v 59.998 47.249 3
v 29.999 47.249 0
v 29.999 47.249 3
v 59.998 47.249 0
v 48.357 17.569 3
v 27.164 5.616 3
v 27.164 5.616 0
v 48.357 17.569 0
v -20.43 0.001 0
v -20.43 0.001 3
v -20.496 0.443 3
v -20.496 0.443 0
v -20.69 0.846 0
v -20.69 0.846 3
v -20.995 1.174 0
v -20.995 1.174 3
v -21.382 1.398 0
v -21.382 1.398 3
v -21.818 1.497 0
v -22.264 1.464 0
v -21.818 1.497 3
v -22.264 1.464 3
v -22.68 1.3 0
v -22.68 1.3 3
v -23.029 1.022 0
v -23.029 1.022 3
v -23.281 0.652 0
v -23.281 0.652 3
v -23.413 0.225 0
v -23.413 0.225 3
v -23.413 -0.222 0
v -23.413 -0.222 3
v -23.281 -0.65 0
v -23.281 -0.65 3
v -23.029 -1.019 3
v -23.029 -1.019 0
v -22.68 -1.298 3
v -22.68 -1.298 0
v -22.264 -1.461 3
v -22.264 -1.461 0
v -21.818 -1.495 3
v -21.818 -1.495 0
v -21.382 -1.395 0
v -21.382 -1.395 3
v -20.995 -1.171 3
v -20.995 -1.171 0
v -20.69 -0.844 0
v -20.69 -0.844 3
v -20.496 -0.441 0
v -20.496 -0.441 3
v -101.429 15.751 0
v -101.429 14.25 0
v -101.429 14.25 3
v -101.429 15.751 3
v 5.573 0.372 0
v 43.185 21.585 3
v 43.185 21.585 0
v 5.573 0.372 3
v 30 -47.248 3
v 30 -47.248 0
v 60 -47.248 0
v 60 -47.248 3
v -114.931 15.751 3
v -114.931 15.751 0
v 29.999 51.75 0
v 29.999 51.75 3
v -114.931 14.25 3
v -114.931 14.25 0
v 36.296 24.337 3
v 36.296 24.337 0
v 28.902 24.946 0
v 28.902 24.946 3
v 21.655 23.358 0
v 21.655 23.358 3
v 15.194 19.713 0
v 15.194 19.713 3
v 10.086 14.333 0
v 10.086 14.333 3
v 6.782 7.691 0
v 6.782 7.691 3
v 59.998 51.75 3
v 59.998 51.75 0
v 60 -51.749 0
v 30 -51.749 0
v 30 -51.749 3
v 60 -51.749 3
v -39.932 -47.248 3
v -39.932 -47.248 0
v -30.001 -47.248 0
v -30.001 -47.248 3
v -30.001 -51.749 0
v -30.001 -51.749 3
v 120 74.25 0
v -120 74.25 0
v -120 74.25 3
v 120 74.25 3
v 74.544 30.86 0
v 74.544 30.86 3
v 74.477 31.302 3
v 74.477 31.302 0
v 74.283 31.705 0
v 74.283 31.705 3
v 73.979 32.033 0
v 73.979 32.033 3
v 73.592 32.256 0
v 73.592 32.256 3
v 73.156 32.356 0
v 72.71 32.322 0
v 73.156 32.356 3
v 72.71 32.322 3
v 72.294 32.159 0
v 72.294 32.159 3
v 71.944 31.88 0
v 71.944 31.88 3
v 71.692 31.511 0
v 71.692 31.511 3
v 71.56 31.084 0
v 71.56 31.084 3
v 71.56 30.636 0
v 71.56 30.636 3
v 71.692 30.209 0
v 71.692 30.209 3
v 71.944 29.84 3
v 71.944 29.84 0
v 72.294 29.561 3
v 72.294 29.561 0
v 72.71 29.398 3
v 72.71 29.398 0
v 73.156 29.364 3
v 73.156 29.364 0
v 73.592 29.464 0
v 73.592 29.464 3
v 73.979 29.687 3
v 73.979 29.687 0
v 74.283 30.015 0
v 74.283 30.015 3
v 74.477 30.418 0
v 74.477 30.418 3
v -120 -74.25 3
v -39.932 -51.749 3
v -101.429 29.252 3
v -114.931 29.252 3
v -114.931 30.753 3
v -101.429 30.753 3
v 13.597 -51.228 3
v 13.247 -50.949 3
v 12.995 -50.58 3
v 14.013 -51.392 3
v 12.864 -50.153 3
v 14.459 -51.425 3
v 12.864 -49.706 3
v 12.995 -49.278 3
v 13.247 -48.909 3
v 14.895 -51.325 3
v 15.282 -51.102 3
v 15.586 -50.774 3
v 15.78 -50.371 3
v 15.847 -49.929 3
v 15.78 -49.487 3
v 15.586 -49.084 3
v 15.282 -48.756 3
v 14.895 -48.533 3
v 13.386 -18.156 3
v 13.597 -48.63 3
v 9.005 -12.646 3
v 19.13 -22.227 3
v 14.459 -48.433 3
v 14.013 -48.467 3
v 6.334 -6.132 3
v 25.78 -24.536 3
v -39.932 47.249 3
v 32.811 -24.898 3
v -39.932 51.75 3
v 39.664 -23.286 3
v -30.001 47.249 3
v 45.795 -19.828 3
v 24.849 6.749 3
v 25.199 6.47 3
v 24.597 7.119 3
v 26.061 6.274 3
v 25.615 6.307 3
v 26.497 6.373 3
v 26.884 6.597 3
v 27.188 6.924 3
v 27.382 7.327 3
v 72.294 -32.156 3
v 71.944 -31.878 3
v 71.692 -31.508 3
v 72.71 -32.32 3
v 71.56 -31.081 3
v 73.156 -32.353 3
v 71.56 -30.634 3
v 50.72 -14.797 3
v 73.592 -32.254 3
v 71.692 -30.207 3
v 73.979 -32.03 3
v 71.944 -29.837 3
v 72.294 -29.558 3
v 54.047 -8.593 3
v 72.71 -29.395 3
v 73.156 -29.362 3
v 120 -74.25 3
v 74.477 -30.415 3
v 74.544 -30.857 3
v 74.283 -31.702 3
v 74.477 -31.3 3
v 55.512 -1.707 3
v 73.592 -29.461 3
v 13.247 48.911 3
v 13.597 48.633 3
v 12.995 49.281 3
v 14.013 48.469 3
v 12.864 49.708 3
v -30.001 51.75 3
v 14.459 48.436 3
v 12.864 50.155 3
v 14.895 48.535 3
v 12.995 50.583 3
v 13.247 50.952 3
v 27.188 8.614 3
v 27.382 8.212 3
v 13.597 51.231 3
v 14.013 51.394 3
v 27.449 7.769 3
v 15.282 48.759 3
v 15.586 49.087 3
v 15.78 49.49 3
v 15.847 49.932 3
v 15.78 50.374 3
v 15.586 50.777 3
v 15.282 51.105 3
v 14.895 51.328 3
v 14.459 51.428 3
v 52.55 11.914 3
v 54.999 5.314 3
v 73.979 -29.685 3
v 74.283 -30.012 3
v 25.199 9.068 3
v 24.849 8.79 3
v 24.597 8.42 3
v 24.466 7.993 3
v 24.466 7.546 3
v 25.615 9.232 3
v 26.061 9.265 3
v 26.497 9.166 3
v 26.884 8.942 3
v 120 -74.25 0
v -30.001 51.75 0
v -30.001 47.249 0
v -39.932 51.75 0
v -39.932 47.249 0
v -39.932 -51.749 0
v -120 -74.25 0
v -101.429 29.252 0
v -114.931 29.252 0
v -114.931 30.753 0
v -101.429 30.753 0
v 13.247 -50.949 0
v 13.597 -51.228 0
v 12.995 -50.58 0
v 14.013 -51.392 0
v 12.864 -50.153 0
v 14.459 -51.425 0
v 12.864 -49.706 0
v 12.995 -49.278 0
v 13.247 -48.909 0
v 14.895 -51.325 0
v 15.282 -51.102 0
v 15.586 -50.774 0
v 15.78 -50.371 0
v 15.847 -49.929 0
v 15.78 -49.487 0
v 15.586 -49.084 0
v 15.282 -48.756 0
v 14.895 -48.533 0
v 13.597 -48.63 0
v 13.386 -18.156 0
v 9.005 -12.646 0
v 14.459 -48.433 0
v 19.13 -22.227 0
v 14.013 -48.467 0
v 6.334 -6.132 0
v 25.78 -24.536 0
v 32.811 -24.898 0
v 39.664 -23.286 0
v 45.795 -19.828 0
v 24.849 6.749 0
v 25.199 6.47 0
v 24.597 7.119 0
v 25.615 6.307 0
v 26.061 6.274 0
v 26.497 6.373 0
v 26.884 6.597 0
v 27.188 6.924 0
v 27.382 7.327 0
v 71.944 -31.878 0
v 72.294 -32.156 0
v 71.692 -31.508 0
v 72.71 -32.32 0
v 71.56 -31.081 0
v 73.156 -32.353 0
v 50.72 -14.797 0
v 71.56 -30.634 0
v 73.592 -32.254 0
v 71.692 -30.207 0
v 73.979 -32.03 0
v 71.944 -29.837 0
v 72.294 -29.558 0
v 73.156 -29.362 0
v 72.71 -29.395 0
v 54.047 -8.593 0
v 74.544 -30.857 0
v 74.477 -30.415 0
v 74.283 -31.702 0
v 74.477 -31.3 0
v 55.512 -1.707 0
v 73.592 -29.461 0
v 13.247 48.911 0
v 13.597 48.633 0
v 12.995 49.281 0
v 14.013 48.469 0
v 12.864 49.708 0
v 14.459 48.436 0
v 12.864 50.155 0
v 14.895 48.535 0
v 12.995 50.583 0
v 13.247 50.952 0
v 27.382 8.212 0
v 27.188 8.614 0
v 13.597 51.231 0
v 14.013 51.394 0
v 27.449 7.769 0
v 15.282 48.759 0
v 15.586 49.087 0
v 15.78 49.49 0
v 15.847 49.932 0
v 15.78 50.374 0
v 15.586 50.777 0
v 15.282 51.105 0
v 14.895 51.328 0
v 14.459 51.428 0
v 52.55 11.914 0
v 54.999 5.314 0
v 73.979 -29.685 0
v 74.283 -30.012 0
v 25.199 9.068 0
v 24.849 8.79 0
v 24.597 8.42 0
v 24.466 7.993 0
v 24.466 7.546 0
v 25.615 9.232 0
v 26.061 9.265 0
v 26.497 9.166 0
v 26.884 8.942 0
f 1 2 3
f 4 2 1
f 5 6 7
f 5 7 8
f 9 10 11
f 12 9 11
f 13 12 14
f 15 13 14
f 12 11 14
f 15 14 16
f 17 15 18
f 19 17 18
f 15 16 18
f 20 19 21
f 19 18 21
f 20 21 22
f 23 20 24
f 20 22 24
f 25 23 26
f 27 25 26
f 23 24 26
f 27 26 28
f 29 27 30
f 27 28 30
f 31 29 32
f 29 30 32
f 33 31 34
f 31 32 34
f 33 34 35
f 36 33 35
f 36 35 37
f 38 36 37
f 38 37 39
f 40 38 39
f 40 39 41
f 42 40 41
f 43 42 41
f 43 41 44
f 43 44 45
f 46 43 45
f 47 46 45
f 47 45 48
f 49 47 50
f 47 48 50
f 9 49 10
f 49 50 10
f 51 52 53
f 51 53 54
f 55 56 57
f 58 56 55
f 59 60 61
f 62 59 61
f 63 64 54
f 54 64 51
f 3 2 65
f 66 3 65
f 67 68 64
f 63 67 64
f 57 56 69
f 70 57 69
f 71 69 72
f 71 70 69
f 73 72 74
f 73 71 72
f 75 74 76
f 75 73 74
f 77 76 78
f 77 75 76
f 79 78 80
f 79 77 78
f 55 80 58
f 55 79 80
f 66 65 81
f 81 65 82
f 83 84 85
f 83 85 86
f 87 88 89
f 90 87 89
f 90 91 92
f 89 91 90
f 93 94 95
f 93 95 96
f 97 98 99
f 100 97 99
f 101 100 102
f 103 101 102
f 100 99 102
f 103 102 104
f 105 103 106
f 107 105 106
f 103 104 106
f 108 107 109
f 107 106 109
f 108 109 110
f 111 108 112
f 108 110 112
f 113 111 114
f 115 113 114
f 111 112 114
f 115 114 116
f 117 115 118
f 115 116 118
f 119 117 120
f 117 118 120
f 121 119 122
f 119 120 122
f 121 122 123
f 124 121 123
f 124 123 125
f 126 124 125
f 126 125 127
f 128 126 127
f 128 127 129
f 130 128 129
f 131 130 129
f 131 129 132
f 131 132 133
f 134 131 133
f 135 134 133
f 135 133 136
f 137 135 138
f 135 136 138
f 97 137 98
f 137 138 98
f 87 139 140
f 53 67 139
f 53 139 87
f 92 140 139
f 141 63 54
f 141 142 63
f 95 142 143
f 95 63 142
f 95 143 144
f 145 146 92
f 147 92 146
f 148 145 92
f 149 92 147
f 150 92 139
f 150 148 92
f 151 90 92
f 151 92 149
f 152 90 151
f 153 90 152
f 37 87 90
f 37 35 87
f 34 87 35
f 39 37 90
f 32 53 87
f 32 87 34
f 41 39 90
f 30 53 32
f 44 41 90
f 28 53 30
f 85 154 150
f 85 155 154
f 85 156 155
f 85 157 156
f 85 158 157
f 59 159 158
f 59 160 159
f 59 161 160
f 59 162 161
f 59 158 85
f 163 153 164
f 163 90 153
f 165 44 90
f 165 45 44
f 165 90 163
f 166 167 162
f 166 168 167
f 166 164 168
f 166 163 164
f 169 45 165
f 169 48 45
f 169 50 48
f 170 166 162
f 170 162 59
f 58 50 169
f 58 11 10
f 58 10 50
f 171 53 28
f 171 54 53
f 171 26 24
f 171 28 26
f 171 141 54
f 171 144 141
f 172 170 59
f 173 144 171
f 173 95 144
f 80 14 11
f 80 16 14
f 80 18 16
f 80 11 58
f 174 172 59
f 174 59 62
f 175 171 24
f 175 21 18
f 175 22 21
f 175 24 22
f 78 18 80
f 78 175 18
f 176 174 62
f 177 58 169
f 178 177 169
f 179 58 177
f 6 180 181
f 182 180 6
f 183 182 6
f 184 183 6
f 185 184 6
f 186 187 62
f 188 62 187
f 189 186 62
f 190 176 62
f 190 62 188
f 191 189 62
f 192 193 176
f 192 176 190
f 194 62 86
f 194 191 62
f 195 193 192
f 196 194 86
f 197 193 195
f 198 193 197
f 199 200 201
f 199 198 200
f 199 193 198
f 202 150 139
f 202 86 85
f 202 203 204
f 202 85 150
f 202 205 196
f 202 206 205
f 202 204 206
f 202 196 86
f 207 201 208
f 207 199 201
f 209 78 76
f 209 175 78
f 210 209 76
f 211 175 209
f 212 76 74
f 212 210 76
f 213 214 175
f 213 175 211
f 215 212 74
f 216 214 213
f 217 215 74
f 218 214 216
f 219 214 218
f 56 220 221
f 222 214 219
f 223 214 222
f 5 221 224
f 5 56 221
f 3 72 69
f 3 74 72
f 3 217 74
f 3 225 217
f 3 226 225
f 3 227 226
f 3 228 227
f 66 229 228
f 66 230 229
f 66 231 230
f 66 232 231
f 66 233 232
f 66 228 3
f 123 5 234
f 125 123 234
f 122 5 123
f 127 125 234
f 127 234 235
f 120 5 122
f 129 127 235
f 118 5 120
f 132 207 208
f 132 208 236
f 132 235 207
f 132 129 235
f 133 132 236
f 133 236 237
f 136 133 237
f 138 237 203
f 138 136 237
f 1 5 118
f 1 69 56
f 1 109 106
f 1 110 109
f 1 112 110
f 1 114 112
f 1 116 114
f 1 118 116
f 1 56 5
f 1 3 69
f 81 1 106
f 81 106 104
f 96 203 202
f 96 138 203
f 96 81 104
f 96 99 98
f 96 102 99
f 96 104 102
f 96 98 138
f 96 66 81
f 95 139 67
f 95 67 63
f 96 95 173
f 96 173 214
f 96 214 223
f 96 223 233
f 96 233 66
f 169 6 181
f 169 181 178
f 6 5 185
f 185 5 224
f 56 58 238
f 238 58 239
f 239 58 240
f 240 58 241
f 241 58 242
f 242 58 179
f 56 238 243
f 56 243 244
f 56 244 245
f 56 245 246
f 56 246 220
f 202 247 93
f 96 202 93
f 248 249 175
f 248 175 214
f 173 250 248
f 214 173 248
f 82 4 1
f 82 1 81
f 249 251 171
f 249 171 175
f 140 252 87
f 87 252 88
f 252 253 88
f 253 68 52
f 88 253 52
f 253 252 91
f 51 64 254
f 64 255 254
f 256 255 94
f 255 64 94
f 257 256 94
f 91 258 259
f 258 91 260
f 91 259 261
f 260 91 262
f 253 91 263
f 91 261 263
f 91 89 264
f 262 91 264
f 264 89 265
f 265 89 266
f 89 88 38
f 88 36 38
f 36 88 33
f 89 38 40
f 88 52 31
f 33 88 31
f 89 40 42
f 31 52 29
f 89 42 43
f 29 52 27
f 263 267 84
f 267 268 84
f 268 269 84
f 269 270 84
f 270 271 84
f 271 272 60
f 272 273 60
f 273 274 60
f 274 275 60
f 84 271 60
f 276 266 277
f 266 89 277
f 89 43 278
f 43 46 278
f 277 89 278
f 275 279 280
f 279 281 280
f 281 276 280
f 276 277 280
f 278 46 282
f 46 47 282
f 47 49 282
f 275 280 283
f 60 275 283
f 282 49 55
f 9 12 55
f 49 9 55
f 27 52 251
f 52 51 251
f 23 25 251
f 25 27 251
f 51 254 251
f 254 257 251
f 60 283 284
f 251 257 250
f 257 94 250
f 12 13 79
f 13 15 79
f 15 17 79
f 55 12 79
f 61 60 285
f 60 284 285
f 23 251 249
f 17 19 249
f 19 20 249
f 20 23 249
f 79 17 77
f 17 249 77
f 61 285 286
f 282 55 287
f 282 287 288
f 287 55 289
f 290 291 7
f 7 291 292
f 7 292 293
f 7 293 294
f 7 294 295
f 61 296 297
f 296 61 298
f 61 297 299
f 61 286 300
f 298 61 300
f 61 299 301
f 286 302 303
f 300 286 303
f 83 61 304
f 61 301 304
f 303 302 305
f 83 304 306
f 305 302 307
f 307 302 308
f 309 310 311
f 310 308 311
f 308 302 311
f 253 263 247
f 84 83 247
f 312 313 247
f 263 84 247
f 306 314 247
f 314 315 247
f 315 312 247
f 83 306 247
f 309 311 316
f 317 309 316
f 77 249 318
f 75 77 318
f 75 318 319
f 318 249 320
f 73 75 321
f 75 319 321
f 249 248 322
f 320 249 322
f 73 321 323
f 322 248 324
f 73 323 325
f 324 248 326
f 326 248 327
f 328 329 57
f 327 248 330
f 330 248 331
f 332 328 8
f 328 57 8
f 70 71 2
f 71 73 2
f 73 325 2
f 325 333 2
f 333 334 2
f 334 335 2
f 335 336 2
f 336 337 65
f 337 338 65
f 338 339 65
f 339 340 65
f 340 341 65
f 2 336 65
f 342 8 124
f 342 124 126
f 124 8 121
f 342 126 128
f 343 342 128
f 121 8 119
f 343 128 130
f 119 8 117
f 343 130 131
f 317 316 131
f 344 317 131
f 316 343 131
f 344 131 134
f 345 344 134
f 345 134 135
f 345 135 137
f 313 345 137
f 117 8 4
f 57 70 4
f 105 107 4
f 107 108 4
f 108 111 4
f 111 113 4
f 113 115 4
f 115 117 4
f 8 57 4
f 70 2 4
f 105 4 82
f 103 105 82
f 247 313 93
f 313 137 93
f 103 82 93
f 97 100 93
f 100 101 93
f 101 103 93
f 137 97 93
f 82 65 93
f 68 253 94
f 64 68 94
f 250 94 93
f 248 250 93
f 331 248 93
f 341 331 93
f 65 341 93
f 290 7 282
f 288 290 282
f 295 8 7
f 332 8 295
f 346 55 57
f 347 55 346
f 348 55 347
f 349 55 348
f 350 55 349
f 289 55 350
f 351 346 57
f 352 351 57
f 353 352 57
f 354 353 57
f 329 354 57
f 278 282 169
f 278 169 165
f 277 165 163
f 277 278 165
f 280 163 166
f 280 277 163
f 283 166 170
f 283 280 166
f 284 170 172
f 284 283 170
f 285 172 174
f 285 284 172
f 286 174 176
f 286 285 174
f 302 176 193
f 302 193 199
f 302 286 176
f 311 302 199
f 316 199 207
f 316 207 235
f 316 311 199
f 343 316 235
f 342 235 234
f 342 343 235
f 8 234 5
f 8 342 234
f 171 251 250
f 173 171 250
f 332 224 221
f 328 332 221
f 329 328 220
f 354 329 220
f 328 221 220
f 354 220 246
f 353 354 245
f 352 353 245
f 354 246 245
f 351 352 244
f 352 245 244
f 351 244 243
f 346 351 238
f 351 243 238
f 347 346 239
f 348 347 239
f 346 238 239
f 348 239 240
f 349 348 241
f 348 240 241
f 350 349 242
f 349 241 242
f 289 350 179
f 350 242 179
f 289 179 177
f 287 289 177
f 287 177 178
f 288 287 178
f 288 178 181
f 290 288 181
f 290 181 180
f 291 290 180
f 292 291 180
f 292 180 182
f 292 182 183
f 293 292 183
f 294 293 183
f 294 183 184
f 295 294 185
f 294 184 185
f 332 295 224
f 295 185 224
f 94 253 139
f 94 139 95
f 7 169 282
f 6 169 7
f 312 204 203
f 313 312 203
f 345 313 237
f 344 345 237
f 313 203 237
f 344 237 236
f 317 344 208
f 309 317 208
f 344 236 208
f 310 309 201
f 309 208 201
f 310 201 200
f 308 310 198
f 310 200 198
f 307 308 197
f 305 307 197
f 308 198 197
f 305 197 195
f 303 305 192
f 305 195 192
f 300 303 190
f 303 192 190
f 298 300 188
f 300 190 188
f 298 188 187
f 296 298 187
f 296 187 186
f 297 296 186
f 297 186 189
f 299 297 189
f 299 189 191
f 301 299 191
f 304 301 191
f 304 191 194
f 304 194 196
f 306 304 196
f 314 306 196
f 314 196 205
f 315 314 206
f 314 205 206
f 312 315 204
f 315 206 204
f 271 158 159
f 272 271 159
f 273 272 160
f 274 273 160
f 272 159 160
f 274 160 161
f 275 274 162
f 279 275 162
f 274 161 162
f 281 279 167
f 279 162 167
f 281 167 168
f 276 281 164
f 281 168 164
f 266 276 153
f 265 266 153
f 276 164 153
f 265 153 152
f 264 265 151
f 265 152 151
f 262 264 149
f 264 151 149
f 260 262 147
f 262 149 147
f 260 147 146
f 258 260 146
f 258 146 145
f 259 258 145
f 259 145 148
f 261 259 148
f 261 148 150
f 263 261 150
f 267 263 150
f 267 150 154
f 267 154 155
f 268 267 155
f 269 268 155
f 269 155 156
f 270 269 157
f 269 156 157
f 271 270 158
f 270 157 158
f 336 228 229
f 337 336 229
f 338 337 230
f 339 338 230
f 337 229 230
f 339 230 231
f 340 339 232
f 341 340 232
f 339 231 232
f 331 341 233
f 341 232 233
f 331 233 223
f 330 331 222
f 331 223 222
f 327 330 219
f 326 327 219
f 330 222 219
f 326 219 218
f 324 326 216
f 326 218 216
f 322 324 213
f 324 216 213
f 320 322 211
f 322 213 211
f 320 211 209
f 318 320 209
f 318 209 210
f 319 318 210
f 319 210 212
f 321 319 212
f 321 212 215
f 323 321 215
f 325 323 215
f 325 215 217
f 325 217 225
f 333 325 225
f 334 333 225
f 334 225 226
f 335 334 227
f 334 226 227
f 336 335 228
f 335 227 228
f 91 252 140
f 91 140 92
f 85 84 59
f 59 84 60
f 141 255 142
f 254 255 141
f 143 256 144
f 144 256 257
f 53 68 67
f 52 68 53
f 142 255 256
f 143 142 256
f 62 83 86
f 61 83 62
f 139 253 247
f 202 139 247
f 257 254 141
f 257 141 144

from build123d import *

# Parameters (mm, degrees)
SKETCH1_W           = 240.000854432
SKETCH1_H           = 148.499462854
SKETCH1_R           = 25
SKETCH1_W_2         = 13.501501462
SKETCH1_H_2         = 1.500166829
SKETCH1_H_3         = 1.501200358
SKETCH1_W_3         = 9.930659991
SKETCH1_H_4         = 4.500500488
SKETCH1_W_4         = 29.999719231
SKETCH1_H_5         = 4.500500487
SKETCH1_W_5         = 30.000235995
BOSS_EXTRUDE2_DEPTH = 3
SKETCH2_R           = 1.5
BOSS_EXTRUDE3_DEPTH = 3
SKETCH3_R           = 1.5
CUT_EXTRUDE1_DEPTH  = 3
SKETCH3_3_R         = 1.5
CUT_EXTRUDE2_DEPTH  = 3


with BuildPart() as part:
    # Sketch1 → Boss-Extrude2 (new body)
    with BuildSketch(Plane.XY):
        Rectangle(SKETCH1_W, SKETCH1_H)
        with Locations((30.570227043, 0.001291911)):
            Circle(SKETCH1_R, mode=Mode.SUBTRACT)
        with Locations((-108.180218479, 30.002561435)):
            Rectangle(SKETCH1_W_2, SKETCH1_H_2, mode=Mode.SUBTRACT)
        with Locations((-108.180218479, 15.00037638)):
            Rectangle(SKETCH1_W_2, SKETCH1_H_3, mode=Mode.SUBTRACT)
        with Locations((-34.96659952, 49.499562569)):
            Rectangle(SKETCH1_W_3, SKETCH1_H_4, mode=Mode.SUBTRACT)
        with Locations((44.998545318, 49.499562569)):
            Rectangle(SKETCH1_W_4, SKETCH1_H_4, mode=Mode.SUBTRACT)
        with Locations((-34.96659952, -49.498529041)):
            Rectangle(SKETCH1_W_3, SKETCH1_H_5, mode=Mode.SUBTRACT)
        with Locations((45.000353993, -49.498529041)):
            Rectangle(SKETCH1_W_5, SKETCH1_H_5, mode=Mode.SUBTRACT)
    extrude(amount=BOSS_EXTRUDE2_DEPTH)

    # Sketch2 → Boss-Extrude3 (add)
    # profile 1 of 2: a face of its own
    with BuildSketch(Plane.XY.offset(3)):
        with Locations((45.531251612, -26.95033278)):
            Circle(SKETCH2_R)
    # profile 2 of 2: a face of its own
    with BuildSketch(Plane.XY.offset(3)):
        Polygon((27.163645512, 5.615664927), (48.357135802, 17.569042957), (45.390356123, 22.829180815), (3.83834926, -0.606640239), (6.127103067, -6.249192671), align=None)
        with Locations((25.948903296, 7.769418226)):
            Circle(SKETCH2_R, mode=Mode.SUBTRACT)
    extrude(amount=-BOSS_EXTRUDE3_DEPTH)

    # Sketch3 → Cut-Extrude1 (cut)
    with BuildSketch(Plane.XY.offset(3)):
        with Locations((-21.929772957, 0.001291911)):
            Circle(SKETCH3_R)
    extrude(amount=-CUT_EXTRUDE1_DEPTH, mode=Mode.SUBTRACT)

    # Sketch3<3> → Cut-Extrude2 (cut)
    with BuildSketch(Plane.XY.offset(3)):
        with Locations((-21.929772957, 0.001291911)):
            Circle(SKETCH3_3_R)
        with Locations((14.346834838, 49.931759016)):
            Circle(SKETCH3_3_R)
        with Locations((73.043619248, 30.860017656)):
            Circle(SKETCH3_3_R)
        with Locations((73.043619248, -30.857433835)):
            Circle(SKETCH3_3_R)
        with Locations((14.346834838, -49.929175195)):
            Circle(SKETCH3_3_R)
    extrude(amount=-CUT_EXTRUDE2_DEPTH, mode=Mode.SUBTRACT)


solid = part.part
